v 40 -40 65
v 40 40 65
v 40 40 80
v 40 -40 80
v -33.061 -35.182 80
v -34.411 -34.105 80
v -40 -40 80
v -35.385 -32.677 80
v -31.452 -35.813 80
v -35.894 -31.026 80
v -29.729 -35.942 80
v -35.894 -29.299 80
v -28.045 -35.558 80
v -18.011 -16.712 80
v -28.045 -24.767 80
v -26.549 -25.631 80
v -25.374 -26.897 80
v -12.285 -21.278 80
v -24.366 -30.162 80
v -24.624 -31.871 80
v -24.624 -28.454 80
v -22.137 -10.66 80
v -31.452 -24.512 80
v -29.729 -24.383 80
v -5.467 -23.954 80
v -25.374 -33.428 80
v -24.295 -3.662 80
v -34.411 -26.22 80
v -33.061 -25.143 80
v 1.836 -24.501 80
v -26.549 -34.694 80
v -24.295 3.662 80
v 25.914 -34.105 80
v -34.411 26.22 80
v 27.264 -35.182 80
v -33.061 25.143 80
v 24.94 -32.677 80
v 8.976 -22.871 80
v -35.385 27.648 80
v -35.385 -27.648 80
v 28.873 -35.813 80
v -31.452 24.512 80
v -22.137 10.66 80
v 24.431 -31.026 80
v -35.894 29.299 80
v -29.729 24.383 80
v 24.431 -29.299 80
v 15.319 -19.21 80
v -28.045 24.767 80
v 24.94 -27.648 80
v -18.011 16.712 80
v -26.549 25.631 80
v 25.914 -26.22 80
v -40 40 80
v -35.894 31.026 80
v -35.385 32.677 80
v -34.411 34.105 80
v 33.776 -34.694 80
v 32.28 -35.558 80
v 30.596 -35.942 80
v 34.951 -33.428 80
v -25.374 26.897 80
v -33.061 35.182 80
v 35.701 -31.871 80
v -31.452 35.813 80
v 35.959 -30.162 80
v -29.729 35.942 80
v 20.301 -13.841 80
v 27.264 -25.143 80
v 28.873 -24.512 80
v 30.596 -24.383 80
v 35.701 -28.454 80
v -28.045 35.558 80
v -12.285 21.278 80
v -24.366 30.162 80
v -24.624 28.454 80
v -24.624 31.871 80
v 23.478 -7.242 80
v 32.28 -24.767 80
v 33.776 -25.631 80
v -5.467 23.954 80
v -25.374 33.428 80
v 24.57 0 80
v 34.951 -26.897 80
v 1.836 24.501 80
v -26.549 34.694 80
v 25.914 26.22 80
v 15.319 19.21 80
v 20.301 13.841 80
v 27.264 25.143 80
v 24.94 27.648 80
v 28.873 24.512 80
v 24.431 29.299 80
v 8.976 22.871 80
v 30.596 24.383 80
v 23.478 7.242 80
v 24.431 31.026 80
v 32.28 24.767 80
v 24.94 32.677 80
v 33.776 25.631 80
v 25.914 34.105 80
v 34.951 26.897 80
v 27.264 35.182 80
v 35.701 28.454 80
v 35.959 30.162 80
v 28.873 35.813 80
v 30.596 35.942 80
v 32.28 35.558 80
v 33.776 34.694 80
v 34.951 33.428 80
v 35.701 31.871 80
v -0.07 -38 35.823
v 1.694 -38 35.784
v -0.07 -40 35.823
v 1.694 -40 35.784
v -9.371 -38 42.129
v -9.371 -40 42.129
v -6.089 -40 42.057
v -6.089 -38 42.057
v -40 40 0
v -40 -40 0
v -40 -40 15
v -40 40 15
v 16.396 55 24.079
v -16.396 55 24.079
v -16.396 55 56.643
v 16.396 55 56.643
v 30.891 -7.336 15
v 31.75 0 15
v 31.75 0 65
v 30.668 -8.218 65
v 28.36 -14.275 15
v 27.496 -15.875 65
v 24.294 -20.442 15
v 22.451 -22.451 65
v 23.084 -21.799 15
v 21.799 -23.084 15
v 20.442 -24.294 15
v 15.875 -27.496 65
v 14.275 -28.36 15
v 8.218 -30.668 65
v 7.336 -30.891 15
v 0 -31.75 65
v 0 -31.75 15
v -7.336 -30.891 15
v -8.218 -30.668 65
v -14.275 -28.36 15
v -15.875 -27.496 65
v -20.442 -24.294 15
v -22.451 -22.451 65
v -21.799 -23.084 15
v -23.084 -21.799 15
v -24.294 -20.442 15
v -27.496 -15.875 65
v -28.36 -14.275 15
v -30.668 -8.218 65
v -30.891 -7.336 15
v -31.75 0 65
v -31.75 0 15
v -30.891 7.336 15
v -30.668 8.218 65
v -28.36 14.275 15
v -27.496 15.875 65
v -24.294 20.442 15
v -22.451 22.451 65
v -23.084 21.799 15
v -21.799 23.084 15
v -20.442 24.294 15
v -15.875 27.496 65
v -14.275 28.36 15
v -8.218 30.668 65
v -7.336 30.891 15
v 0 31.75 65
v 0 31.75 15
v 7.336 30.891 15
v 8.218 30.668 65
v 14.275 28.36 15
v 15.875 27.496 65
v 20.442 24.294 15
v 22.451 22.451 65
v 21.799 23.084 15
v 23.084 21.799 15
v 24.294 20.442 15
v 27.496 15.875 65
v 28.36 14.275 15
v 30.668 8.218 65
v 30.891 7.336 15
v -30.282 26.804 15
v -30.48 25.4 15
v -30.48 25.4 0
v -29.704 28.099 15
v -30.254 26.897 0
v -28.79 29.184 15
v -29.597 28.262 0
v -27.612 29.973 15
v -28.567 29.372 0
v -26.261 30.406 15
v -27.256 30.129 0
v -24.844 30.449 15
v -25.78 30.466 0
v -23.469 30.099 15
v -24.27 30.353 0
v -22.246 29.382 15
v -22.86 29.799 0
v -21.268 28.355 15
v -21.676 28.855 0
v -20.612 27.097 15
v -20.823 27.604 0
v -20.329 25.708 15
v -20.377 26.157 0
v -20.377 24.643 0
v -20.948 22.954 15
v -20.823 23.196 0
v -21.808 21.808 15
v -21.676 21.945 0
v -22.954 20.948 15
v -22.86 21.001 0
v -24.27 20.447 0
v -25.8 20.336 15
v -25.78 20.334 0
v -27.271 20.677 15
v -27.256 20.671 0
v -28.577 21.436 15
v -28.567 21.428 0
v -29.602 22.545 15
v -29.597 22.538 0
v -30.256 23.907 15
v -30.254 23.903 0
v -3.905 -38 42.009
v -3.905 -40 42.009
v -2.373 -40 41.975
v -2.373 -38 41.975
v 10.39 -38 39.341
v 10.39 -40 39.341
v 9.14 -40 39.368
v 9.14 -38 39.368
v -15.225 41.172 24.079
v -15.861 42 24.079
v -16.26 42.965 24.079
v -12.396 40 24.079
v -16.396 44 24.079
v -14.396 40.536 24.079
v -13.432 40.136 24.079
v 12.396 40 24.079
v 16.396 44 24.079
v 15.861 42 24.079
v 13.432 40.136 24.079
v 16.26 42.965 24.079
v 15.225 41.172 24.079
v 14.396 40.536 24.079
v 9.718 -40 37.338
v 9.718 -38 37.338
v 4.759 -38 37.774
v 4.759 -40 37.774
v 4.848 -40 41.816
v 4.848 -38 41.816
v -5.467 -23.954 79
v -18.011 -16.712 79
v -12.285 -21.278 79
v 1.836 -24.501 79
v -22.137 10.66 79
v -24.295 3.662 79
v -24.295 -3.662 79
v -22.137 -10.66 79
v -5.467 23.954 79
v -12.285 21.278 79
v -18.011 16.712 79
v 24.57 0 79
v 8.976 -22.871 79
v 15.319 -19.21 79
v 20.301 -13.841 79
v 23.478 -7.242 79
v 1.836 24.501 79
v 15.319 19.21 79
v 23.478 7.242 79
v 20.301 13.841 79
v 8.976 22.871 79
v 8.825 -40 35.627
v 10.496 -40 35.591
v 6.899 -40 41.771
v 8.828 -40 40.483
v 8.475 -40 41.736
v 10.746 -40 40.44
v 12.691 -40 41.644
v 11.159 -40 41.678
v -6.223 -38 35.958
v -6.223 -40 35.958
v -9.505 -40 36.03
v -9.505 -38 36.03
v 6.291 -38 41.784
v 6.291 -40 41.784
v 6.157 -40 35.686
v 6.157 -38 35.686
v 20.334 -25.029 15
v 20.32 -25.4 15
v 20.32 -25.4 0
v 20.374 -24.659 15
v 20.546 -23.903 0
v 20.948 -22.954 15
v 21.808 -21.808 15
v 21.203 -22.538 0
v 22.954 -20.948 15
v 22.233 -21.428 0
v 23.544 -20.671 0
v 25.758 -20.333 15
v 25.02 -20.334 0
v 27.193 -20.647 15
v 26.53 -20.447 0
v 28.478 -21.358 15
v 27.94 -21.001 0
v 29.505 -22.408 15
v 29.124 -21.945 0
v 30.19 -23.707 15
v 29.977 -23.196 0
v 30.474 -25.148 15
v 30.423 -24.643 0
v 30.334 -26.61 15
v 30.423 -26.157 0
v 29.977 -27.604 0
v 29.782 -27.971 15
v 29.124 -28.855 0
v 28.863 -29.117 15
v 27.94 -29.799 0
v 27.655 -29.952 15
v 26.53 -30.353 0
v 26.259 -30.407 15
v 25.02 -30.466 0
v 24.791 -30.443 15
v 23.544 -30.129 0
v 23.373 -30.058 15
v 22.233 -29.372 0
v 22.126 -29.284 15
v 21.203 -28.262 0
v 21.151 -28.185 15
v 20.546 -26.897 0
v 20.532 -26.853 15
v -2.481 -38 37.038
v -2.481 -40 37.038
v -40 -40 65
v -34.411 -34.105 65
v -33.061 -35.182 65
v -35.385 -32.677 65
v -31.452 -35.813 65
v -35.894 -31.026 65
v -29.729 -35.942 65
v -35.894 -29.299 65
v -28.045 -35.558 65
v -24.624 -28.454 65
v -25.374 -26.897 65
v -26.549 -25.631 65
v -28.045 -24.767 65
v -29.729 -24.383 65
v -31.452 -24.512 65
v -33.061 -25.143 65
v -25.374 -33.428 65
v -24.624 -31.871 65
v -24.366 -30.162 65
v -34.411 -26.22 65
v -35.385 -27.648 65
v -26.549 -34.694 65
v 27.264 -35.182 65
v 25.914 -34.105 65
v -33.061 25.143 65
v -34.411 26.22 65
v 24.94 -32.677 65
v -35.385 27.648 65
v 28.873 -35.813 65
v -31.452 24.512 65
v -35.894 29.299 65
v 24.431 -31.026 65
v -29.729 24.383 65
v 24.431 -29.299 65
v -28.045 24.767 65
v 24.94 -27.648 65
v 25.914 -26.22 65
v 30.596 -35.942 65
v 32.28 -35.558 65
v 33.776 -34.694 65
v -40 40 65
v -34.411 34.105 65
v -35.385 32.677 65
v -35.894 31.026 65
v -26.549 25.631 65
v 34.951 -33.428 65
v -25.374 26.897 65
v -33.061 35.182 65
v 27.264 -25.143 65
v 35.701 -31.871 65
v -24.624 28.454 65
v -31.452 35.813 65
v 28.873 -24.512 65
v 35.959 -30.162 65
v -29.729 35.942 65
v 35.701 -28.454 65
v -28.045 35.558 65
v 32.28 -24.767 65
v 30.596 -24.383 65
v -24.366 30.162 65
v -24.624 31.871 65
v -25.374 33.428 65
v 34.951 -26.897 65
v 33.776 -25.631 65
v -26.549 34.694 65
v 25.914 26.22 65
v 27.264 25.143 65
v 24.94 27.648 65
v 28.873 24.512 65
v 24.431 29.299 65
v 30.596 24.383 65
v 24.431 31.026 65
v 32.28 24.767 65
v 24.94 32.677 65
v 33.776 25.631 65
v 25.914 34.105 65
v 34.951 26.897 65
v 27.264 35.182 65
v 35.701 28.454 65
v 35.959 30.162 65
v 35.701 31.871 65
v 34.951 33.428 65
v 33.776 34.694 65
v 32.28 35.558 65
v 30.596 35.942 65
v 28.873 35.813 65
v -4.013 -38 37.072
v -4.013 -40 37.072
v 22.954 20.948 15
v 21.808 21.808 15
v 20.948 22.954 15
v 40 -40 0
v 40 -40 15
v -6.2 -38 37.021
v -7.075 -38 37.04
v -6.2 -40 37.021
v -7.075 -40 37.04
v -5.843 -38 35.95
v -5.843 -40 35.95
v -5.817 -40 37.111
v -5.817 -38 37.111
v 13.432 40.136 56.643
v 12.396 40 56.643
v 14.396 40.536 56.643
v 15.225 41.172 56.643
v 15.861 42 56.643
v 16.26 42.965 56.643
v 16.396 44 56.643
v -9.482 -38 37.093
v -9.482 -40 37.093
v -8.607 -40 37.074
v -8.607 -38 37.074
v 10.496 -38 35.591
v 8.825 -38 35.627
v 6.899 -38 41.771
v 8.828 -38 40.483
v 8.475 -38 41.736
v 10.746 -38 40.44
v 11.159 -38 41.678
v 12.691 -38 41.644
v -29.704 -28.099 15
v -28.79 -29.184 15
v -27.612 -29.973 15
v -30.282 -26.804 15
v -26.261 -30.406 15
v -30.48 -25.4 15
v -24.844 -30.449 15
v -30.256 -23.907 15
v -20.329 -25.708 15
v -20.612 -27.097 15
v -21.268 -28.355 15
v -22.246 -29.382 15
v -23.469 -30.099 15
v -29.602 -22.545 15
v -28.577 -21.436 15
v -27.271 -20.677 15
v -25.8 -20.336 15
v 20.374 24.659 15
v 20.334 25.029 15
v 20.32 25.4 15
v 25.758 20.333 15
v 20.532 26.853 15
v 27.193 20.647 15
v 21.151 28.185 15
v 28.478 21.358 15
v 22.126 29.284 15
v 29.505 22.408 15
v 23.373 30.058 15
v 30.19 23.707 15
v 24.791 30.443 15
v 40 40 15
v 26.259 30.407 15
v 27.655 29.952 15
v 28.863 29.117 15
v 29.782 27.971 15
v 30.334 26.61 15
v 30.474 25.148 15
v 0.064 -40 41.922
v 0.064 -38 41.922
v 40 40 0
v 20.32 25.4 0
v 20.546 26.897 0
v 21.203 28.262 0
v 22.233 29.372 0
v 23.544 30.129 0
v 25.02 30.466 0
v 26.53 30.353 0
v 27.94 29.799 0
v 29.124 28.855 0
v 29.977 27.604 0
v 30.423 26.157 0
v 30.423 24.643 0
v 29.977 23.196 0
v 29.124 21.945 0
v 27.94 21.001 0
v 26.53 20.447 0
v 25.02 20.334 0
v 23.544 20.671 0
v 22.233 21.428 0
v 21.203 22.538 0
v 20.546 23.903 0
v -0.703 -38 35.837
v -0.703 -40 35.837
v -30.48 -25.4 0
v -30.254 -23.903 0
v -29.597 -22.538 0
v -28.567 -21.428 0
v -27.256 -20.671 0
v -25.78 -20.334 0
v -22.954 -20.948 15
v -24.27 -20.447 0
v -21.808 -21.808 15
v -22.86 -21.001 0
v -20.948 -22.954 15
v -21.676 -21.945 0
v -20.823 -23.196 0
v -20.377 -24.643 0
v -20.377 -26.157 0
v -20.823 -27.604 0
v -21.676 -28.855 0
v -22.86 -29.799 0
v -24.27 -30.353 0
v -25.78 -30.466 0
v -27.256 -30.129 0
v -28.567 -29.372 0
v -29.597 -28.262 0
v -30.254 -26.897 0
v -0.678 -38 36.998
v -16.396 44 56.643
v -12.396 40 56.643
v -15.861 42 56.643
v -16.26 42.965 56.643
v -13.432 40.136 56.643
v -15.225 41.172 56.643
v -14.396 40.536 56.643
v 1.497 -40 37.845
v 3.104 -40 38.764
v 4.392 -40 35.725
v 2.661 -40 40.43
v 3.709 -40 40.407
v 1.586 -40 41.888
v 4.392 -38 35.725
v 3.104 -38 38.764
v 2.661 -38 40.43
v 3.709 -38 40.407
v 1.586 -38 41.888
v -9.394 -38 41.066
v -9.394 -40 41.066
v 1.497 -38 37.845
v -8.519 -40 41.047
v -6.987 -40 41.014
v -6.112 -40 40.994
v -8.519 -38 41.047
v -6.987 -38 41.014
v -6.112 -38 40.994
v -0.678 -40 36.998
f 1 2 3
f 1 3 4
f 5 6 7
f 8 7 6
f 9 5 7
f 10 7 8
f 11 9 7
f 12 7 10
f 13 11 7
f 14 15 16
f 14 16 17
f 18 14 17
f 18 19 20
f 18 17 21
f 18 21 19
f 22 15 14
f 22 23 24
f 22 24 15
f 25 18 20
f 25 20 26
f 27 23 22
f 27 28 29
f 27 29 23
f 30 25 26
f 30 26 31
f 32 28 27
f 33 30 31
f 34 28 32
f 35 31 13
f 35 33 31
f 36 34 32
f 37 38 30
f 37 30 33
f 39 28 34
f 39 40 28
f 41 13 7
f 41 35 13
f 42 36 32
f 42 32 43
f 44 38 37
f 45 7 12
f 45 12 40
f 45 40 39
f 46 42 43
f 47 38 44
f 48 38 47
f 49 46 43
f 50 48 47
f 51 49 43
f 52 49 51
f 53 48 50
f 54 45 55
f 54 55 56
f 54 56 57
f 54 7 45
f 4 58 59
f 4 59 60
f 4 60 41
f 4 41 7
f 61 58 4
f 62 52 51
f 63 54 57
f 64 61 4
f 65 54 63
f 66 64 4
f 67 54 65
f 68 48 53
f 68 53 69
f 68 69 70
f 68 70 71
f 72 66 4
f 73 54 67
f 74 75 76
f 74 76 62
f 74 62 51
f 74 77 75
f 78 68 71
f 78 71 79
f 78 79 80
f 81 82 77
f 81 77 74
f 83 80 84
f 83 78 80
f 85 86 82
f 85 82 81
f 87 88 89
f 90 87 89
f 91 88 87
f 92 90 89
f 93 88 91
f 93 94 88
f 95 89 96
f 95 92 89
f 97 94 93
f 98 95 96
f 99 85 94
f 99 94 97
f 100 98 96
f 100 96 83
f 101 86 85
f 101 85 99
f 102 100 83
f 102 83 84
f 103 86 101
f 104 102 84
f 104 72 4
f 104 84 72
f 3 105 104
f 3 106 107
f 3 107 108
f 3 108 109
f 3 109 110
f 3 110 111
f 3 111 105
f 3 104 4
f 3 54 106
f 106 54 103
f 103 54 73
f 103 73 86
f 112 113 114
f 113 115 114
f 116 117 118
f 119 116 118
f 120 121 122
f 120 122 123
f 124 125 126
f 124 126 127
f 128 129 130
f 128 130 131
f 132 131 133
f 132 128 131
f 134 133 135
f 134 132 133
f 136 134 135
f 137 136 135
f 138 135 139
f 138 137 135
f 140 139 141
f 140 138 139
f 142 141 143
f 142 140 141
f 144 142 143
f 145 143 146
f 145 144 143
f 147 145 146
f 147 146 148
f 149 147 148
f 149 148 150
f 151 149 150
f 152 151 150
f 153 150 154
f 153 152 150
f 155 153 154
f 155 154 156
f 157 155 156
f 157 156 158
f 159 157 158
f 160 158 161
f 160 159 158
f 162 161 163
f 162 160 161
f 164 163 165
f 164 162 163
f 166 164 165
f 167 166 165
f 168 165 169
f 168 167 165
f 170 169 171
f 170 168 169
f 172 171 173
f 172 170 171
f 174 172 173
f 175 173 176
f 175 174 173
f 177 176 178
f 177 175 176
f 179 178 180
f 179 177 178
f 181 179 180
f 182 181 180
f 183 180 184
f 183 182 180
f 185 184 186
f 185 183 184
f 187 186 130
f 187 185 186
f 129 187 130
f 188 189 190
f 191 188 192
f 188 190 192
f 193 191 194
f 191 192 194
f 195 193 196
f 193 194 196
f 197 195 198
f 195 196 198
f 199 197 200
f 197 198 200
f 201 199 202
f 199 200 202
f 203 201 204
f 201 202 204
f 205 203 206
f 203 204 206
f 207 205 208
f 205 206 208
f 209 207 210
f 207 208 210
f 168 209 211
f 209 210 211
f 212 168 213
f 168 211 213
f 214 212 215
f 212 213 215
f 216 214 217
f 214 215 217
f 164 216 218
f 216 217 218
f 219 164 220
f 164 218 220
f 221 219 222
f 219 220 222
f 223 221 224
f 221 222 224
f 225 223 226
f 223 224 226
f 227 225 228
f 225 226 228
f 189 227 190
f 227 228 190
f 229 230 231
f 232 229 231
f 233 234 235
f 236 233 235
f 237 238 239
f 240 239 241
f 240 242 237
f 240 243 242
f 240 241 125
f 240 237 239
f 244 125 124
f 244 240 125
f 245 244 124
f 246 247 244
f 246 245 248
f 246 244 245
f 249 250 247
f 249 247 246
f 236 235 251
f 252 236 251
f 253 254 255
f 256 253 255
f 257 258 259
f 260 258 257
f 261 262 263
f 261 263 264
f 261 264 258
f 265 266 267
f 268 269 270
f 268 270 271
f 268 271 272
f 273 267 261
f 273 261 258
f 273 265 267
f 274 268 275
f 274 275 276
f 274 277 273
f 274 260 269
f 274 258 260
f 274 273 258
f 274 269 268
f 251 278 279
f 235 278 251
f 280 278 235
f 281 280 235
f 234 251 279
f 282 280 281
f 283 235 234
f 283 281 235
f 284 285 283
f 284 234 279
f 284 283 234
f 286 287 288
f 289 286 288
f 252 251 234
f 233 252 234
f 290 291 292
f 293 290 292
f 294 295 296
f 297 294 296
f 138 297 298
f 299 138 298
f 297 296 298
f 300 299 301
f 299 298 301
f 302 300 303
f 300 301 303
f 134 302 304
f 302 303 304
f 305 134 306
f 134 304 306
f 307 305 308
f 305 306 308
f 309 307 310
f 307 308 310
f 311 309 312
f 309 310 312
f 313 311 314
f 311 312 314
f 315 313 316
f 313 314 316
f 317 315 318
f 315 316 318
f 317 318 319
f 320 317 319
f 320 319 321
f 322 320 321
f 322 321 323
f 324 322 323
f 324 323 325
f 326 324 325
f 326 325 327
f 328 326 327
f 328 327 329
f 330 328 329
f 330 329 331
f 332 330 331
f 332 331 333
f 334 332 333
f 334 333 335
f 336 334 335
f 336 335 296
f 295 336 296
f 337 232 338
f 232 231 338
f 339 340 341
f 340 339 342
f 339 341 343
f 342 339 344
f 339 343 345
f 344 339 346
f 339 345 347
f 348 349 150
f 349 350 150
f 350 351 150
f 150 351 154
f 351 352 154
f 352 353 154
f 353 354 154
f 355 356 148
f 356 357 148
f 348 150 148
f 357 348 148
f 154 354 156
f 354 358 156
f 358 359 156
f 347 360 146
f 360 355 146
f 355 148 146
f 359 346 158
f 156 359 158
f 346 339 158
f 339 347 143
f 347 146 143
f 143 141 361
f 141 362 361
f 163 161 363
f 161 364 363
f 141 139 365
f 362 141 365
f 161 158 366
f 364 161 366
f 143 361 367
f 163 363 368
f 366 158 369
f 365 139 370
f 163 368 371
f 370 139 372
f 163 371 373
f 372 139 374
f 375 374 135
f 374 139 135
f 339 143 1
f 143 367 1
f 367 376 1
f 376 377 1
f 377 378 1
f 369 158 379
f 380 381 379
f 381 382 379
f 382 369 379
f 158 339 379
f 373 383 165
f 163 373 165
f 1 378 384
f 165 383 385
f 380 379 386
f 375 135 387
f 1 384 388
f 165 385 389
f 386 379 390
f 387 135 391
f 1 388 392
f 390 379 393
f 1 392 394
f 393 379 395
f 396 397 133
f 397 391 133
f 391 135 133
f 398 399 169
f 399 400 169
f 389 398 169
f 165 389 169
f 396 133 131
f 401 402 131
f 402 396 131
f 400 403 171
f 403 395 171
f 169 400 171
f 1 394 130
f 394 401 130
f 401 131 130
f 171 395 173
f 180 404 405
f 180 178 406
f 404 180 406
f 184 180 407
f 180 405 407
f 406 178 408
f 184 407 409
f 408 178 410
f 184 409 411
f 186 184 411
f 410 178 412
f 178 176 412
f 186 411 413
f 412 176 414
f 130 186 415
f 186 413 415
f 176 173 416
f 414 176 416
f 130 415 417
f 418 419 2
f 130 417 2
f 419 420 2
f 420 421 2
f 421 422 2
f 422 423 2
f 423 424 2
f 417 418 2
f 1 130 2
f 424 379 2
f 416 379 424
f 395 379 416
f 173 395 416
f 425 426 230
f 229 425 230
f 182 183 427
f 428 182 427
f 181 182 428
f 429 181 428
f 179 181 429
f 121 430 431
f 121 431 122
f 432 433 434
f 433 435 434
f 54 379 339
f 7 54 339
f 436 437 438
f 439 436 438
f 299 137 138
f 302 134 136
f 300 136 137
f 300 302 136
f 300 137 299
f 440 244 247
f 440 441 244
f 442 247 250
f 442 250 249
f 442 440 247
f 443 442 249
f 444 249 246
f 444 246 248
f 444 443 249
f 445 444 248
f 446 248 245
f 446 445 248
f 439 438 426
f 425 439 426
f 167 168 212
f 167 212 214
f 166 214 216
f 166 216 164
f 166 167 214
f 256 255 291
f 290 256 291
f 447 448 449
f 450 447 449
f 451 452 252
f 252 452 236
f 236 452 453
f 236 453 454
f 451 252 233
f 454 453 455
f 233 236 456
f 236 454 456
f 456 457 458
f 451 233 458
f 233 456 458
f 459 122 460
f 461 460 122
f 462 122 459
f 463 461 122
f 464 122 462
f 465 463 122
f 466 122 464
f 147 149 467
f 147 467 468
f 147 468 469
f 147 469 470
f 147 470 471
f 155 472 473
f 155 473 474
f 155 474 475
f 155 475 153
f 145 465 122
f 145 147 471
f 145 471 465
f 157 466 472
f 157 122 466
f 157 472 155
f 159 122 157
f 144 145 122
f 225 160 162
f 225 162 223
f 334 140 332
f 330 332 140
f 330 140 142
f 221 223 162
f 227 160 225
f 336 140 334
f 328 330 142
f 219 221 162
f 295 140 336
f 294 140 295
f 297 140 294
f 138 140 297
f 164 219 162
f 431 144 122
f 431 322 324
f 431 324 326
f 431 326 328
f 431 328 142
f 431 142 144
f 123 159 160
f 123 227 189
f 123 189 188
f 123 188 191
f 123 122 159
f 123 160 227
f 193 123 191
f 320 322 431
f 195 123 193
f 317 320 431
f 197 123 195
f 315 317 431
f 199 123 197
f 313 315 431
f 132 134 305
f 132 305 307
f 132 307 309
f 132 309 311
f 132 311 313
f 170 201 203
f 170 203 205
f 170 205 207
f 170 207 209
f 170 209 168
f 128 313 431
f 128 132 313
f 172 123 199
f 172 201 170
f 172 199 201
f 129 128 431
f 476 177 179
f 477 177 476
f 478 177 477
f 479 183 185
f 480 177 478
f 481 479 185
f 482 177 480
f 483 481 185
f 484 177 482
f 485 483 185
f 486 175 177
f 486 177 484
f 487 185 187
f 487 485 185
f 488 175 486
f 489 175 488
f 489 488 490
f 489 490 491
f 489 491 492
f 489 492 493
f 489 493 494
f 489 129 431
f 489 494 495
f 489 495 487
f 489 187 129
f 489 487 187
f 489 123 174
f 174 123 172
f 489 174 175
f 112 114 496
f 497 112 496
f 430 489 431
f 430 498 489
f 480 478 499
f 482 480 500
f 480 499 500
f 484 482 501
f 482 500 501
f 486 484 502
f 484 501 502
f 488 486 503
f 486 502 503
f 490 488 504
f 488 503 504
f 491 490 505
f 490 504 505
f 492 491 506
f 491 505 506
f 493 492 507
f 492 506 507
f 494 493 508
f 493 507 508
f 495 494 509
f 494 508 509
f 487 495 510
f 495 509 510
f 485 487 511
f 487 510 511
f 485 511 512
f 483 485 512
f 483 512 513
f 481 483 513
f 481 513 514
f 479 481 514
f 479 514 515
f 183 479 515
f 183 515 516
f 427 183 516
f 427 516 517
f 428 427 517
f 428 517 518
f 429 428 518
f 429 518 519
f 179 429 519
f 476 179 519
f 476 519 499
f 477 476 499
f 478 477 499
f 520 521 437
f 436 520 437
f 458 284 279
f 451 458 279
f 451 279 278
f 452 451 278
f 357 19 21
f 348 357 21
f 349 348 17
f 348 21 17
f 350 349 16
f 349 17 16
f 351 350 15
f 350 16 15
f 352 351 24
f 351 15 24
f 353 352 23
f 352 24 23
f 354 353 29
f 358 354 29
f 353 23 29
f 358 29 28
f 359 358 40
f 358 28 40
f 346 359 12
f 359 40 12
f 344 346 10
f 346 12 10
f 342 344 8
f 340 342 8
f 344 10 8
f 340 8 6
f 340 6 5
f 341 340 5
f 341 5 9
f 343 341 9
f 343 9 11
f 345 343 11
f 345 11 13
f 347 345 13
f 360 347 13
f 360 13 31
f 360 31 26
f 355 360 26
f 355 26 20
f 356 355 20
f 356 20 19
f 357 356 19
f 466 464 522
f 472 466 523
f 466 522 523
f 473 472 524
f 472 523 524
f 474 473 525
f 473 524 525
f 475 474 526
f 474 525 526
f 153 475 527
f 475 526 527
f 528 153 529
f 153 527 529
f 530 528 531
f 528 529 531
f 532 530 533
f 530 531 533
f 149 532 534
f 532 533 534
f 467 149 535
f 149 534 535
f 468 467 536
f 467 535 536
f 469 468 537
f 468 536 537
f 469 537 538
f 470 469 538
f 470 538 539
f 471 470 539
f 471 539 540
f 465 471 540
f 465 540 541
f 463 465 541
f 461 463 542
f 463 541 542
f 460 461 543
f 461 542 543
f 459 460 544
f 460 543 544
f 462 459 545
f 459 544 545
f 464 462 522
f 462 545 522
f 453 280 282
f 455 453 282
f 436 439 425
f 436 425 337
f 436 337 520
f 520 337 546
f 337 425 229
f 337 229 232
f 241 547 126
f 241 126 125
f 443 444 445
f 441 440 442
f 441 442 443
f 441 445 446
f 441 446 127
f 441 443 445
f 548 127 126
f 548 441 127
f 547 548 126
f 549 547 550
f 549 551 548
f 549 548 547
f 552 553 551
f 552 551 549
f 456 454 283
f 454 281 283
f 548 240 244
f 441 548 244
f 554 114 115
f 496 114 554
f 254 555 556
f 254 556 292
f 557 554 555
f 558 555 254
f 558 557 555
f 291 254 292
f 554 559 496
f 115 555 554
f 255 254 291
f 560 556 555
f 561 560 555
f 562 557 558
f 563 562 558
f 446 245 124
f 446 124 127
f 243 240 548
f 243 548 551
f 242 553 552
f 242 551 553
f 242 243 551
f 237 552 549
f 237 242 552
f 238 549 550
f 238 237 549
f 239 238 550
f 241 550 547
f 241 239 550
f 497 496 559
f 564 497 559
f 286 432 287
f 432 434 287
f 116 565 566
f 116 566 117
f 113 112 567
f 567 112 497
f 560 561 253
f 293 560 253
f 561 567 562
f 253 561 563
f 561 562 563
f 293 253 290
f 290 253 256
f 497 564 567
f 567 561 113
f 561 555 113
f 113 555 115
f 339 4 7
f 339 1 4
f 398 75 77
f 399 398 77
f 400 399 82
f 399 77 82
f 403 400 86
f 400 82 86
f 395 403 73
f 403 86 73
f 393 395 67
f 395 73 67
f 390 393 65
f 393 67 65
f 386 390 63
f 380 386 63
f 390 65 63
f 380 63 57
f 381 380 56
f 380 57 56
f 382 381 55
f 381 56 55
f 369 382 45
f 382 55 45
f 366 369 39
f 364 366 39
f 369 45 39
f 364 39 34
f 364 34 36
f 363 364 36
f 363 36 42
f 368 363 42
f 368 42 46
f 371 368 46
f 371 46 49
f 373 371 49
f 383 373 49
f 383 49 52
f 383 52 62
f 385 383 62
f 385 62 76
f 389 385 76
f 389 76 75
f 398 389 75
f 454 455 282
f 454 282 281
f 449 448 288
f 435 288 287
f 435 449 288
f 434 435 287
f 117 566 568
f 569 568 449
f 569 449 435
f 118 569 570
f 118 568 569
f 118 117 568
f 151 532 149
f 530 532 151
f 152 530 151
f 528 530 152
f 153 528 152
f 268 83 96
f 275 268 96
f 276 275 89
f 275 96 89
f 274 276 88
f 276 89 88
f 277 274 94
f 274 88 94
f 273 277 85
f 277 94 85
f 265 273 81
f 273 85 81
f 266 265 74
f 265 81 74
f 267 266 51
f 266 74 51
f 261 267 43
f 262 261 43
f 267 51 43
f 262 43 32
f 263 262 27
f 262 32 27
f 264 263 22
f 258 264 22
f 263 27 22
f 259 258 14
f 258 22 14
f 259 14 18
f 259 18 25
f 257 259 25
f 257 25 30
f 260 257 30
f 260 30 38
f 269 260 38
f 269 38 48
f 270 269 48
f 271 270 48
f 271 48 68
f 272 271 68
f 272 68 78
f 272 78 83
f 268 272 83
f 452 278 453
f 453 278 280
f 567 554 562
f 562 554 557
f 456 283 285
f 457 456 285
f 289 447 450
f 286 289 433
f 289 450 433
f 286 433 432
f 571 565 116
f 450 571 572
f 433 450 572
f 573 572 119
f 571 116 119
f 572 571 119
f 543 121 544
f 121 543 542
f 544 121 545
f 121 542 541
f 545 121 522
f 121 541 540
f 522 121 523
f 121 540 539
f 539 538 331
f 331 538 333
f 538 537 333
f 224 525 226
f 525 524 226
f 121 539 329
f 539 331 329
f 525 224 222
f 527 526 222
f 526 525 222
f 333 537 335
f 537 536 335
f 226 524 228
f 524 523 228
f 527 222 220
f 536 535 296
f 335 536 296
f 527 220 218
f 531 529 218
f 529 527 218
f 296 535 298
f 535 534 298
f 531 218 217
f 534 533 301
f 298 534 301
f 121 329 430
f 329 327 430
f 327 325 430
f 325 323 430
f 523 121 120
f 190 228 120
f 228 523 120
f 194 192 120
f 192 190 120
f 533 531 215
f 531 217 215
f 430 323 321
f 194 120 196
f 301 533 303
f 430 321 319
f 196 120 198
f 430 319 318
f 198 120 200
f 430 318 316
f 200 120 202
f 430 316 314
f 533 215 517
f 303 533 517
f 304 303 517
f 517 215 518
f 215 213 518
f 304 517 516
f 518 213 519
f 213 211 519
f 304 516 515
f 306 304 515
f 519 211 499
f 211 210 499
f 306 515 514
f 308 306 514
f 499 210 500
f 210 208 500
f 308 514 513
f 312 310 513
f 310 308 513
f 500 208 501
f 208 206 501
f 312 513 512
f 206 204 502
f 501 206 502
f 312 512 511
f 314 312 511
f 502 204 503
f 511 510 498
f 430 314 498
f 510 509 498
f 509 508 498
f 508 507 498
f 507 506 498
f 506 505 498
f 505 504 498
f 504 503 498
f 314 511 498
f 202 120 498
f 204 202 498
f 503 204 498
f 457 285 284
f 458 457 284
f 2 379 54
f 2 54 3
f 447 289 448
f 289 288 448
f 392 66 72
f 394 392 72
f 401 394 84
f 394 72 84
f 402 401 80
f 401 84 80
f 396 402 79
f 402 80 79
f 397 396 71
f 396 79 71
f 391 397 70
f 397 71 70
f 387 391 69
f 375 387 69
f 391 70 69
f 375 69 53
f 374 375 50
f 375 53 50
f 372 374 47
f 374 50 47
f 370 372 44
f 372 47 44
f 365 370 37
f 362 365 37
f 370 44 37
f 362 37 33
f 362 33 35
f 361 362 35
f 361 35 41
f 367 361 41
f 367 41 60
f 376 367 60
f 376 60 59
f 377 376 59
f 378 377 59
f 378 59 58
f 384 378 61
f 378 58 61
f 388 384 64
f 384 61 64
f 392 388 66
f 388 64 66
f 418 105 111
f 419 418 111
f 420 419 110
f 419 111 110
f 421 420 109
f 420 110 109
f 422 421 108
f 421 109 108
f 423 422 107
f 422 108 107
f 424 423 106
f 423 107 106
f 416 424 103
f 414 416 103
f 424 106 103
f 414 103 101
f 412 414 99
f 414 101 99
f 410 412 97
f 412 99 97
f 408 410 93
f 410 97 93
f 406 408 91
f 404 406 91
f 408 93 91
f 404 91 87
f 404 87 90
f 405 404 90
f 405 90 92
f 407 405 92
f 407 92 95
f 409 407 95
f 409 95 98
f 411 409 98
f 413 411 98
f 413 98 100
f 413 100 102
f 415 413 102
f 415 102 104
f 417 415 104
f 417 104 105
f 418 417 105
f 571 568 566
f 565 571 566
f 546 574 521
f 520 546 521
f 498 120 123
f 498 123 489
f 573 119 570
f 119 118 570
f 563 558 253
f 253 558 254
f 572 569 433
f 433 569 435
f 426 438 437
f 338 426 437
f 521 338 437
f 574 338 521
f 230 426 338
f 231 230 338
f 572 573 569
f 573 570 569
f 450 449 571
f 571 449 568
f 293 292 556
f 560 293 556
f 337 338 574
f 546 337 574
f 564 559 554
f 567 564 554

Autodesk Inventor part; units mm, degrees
ref_plane "YZ Plane" through (0, 0, 0) normal (1, 0, 0) x (0, 1, 0)
ref_plane "XZ Plane" through (0, 0, 0) normal (0, 1, 0) x (-1, 0, 0)
ref_plane "XY Plane" through (0, 0, 0) normal (0, 0, 1) x (1, 0, 0)
sketch "Sketch1" plane through (0, 0, 0) normal (0, 0, 1) x (1, 0, 0)
  line L0 (40, -40) -> (-40, -40)
  line L1 (-40, -40) -> (-40, 40)
  line L2 (-40, 40) -> (40, 40)
  line L3 (40, 40) -> (40, -40)
  line L4 (40, -40) -> (-40, 40) construction
  line L5 (-40, -40) -> (40, 40) construction
  point P0 (0, 0)
  dimension "d2" = 80
extrude "Extrusion1" add sketch "Sketch1" along normal blind 15
sketch "Sketch2" plane through (0, 0, 15) normal (0, 0, 1) x (1, 0, 0)
  circle A0 centre (0, 0) radius 31.75
  dimension "d21" = 63.5
extrude "Extrusion2" add sketch "Sketch2" along normal blind 50
sketch "Sketch3" plane through (0, 0, 65) normal (0, 0, 1) x (1, 0, 0)
  line L0 (-40, 40) -> (-40, -40) projected
  line L1 (40, -40) -> (-40, -40)
  line L2 (-40, -40) -> (-40, 40)
  line L3 (-40, 40) -> (40, 40)
  line L4 (40, 40) -> (40, -40)
  line L5 (40, -40) -> (-40, 40) construction
  line L6 (-40, -40) -> (40, 40) construction
  point P0 (0, 0)
extrude "Extrusion3" add sketch "Sketch3" along normal blind 15
sketch "Sketch4" plane through (-40, 40, 0) normal (0, 1, 0) x (1, 0, 0)
  line L0 (56.3965, -56.6426) -> (23.6035, -56.6426)
  line L1 (23.6035, -56.6426) -> (23.6035, -24.0788)
  line L2 (23.6035, -24.0788) -> (56.3965, -24.0788)
  line L3 (56.3965, -24.0788) -> (56.3965, -56.6426)
  line L4 (56.3965, -56.6426) -> (23.6035, -24.0788) construction
  line L5 (23.6035, -56.6426) -> (56.3965, -24.0788) construction
  point P0 (40, 0)
  point P1 (40, -40.3607)
extrude "Extrusion4" add sketch "Sketch4" along normal blind 15
fillet "Fillet1" radius 4 1 edges at (-16.3965, 40, 40.3607)
fillet "Fillet2" radius 4 1 edges at (16.3965, 40, 40.3607)
sketch "Sketch5" plane through (-40, -40, 65) normal (0, -1, 0) x (1, 0, 0)
  line L0 (52.5319, -29.4542) -> (3.369, -28.3729) construction
  line L1 (3.369, -28.3729) -> (3.6465, -15.7537) construction
  line L2 (3.6465, -15.7537) -> (52.8094, -16.835) construction
  line L3 (52.8094, -16.835) -> (52.5319, -29.4542) construction
  line L4 (52.6907, -23.3562) -> (50.4957, -29.4094)
  line L5 (50.4957, -29.4094) -> (48.8253, -29.3727)
  line L6 (48.8253, -29.3727) -> (46.8986, -23.2288)
  line L7 (46.8986, -23.2288) -> (48.4751, -23.2635)
  line L8 (48.4751, -23.2635) -> (48.8283, -24.5173)
  line L9 (48.8283, -24.5173) -> (50.7458, -24.5595)
  line L10 (50.7458, -24.5595) -> (51.1587, -23.3225)
  line L11 (51.1587, -23.3225) -> (52.6907, -23.3562)
  line L12 (49.14, -25.6317) -> (49.7184, -27.6618)
  line L13 (49.7184, -27.6618) -> (50.3903, -25.6592)
  line L14 (50.3903, -25.6592) -> (49.14, -25.6317)
  line L15 (40.0637, -23.0785) -> (41.5859, -23.112)
  line L16 (41.5859, -23.112) -> (41.497, -27.1546)
  line L17 (41.497, -27.1546) -> (42.6614, -24.5695)
  line L18 (42.6614, -24.5695) -> (43.7091, -24.5926)
  line L19 (43.7091, -24.5926) -> (44.7587, -27.2264)
  line L20 (44.7587, -27.2264) -> (44.8477, -23.1837)
  line L21 (44.8477, -23.1837) -> (46.2907, -23.2155)
  line L22 (46.2907, -23.2155) -> (46.1566, -29.314)
  line L23 (46.1566, -29.314) -> (44.3923, -29.2752)
  line L24 (44.3923, -29.2752) -> (43.1043, -26.2357)
  line L25 (43.1043, -26.2357) -> (41.6939, -29.2158)
  line L26 (41.6939, -29.2158) -> (39.9296, -29.177)
  line L27 (39.9296, -29.177) -> (40.0637, -23.0785)
  line L28 (37.6273, -23.0249) -> (37.5187, -27.9621)
  line L29 (37.5187, -27.9621) -> (39.3225, -28.0017)
  line L30 (39.3225, -28.0017) -> (39.297, -29.1631)
  line L31 (39.297, -29.1631) -> (34.1572, -29.0501)
  line L32 (34.1572, -29.0501) -> (34.1828, -27.8887)
  line L33 (34.1828, -27.8887) -> (35.9866, -27.9284)
  line L34 (35.9866, -27.9284) -> (36.0952, -22.9912)
  line L35 (36.0952, -22.9912) -> (37.6273, -23.0249)
  line L36 (30.6293, -22.871) -> (33.9108, -22.9432)
  line L37 (33.9108, -22.9432) -> (33.8875, -24.0057)
  line L38 (33.8875, -24.0057) -> (33.0127, -23.9865)
  line L39 (33.0127, -23.9865) -> (32.9253, -27.9599)
  line L40 (32.9253, -27.9599) -> (33.8001, -27.9792)
  line L41 (33.8001, -27.9792) -> (33.7767, -29.0417)
  line L42 (33.7767, -29.0417) -> (30.4952, -28.9695)
  line L43 (30.4952, -28.9695) -> (30.5185, -27.907)
  line L44 (30.5185, -27.907) -> (31.3933, -27.9262)
  line L45 (31.3933, -27.9262) -> (31.4807, -23.9528)
  line L46 (31.4807, -23.9528) -> (30.6059, -23.9336)
  line L47 (30.6059, -23.9336) -> (30.6293, -22.871)
  point P0 (40, -65)
extrude "Extrusion5" add sketch "Sketch5" against normal blind 2
sketch "Sketch6" plane through (0, 0, 80) normal (0, 0, 1) x (1, 0, 0)
  circle A0 centre (0, 0) radius 24.5699
extrude "Extrusion6" cut sketch "Sketch6" against normal blind 1
sketch "Sketch7" plane through (0, 0, 80) normal (0, 0, 1) x (1, 0, 0)
  circle A0 centre (30.1625, -30.1625) radius 5.7961
  circle A1 centre (-30.1625, -30.1625) radius 5.7961
  circle A2 centre (-30.1625, 30.1625) radius 5.7961
  circle A3 centre (30.1625, 30.1625) radius 5.7961
  line L0 (30.1625, 30.1625) -> (-30.1625, 30.1625)
  line L1 (-30.1625, 30.1625) -> (-30.1625, -30.1625)
  line L2 (-30.1625, -30.1625) -> (30.1625, -30.1625)
  line L3 (30.1625, -30.1625) -> (30.1625, 30.1625)
  line L4 (30.1625, 30.1625) -> (-30.1625, -30.1625) construction
  line L5 (-30.1625, 30.1625) -> (30.1625, -30.1625) construction
  point P0 (0, 0)
  dimension "d22" = 60.325
extrude "Extrusion7" cut sketch "Sketch7" against normal up to surface (15 mm away) contours A0 L2 L3 | L3 L2 A0 | L3 L0 A3 | A3 L0 L3 | L2 L1 A1 | A1 L1 L2 | L0 L1 A2 | A2 L1 L0
sketch "Sketch8" plane through (0, 0, 0) normal (0, 0, -1) x (-1, 0, 0)
  line L0 (25.4, -25.4) -> (-25.4, -25.4)
  line L1 (-25.4, -25.4) -> (-25.4, 25.4)
  line L2 (-25.4, 25.4) -> (25.4, 25.4)
  line L3 (25.4, 25.4) -> (25.4, -25.4)
  line L4 (25.4, -25.4) -> (-25.4, 25.4) construction
  line L5 (-25.4, -25.4) -> (25.4, 25.4) construction
  circle A0 centre (25.4, 25.4) radius 5.08
  circle A1 centre (25.4, -25.4) radius 5.08
  circle A2 centre (-25.4, -25.4) radius 5.08
  circle A3 centre (-25.4, 25.4) radius 5.08
  point P0 (0, 0)
  dimension "d19" = 50.8
  dimension "d20" = 10.16
extrude "Extrusion8" cut sketch "Sketch8" against normal up to surface (15 mm away) contours A2 L1 L0 | L0 L1 A2 | A1 L3 L0 | L0 L3 A1 | A3 L2 L1 | L1 L2 A3 | A0 L2 L3 | L3 L2 A0
properties part number "sensor_AMTI"
